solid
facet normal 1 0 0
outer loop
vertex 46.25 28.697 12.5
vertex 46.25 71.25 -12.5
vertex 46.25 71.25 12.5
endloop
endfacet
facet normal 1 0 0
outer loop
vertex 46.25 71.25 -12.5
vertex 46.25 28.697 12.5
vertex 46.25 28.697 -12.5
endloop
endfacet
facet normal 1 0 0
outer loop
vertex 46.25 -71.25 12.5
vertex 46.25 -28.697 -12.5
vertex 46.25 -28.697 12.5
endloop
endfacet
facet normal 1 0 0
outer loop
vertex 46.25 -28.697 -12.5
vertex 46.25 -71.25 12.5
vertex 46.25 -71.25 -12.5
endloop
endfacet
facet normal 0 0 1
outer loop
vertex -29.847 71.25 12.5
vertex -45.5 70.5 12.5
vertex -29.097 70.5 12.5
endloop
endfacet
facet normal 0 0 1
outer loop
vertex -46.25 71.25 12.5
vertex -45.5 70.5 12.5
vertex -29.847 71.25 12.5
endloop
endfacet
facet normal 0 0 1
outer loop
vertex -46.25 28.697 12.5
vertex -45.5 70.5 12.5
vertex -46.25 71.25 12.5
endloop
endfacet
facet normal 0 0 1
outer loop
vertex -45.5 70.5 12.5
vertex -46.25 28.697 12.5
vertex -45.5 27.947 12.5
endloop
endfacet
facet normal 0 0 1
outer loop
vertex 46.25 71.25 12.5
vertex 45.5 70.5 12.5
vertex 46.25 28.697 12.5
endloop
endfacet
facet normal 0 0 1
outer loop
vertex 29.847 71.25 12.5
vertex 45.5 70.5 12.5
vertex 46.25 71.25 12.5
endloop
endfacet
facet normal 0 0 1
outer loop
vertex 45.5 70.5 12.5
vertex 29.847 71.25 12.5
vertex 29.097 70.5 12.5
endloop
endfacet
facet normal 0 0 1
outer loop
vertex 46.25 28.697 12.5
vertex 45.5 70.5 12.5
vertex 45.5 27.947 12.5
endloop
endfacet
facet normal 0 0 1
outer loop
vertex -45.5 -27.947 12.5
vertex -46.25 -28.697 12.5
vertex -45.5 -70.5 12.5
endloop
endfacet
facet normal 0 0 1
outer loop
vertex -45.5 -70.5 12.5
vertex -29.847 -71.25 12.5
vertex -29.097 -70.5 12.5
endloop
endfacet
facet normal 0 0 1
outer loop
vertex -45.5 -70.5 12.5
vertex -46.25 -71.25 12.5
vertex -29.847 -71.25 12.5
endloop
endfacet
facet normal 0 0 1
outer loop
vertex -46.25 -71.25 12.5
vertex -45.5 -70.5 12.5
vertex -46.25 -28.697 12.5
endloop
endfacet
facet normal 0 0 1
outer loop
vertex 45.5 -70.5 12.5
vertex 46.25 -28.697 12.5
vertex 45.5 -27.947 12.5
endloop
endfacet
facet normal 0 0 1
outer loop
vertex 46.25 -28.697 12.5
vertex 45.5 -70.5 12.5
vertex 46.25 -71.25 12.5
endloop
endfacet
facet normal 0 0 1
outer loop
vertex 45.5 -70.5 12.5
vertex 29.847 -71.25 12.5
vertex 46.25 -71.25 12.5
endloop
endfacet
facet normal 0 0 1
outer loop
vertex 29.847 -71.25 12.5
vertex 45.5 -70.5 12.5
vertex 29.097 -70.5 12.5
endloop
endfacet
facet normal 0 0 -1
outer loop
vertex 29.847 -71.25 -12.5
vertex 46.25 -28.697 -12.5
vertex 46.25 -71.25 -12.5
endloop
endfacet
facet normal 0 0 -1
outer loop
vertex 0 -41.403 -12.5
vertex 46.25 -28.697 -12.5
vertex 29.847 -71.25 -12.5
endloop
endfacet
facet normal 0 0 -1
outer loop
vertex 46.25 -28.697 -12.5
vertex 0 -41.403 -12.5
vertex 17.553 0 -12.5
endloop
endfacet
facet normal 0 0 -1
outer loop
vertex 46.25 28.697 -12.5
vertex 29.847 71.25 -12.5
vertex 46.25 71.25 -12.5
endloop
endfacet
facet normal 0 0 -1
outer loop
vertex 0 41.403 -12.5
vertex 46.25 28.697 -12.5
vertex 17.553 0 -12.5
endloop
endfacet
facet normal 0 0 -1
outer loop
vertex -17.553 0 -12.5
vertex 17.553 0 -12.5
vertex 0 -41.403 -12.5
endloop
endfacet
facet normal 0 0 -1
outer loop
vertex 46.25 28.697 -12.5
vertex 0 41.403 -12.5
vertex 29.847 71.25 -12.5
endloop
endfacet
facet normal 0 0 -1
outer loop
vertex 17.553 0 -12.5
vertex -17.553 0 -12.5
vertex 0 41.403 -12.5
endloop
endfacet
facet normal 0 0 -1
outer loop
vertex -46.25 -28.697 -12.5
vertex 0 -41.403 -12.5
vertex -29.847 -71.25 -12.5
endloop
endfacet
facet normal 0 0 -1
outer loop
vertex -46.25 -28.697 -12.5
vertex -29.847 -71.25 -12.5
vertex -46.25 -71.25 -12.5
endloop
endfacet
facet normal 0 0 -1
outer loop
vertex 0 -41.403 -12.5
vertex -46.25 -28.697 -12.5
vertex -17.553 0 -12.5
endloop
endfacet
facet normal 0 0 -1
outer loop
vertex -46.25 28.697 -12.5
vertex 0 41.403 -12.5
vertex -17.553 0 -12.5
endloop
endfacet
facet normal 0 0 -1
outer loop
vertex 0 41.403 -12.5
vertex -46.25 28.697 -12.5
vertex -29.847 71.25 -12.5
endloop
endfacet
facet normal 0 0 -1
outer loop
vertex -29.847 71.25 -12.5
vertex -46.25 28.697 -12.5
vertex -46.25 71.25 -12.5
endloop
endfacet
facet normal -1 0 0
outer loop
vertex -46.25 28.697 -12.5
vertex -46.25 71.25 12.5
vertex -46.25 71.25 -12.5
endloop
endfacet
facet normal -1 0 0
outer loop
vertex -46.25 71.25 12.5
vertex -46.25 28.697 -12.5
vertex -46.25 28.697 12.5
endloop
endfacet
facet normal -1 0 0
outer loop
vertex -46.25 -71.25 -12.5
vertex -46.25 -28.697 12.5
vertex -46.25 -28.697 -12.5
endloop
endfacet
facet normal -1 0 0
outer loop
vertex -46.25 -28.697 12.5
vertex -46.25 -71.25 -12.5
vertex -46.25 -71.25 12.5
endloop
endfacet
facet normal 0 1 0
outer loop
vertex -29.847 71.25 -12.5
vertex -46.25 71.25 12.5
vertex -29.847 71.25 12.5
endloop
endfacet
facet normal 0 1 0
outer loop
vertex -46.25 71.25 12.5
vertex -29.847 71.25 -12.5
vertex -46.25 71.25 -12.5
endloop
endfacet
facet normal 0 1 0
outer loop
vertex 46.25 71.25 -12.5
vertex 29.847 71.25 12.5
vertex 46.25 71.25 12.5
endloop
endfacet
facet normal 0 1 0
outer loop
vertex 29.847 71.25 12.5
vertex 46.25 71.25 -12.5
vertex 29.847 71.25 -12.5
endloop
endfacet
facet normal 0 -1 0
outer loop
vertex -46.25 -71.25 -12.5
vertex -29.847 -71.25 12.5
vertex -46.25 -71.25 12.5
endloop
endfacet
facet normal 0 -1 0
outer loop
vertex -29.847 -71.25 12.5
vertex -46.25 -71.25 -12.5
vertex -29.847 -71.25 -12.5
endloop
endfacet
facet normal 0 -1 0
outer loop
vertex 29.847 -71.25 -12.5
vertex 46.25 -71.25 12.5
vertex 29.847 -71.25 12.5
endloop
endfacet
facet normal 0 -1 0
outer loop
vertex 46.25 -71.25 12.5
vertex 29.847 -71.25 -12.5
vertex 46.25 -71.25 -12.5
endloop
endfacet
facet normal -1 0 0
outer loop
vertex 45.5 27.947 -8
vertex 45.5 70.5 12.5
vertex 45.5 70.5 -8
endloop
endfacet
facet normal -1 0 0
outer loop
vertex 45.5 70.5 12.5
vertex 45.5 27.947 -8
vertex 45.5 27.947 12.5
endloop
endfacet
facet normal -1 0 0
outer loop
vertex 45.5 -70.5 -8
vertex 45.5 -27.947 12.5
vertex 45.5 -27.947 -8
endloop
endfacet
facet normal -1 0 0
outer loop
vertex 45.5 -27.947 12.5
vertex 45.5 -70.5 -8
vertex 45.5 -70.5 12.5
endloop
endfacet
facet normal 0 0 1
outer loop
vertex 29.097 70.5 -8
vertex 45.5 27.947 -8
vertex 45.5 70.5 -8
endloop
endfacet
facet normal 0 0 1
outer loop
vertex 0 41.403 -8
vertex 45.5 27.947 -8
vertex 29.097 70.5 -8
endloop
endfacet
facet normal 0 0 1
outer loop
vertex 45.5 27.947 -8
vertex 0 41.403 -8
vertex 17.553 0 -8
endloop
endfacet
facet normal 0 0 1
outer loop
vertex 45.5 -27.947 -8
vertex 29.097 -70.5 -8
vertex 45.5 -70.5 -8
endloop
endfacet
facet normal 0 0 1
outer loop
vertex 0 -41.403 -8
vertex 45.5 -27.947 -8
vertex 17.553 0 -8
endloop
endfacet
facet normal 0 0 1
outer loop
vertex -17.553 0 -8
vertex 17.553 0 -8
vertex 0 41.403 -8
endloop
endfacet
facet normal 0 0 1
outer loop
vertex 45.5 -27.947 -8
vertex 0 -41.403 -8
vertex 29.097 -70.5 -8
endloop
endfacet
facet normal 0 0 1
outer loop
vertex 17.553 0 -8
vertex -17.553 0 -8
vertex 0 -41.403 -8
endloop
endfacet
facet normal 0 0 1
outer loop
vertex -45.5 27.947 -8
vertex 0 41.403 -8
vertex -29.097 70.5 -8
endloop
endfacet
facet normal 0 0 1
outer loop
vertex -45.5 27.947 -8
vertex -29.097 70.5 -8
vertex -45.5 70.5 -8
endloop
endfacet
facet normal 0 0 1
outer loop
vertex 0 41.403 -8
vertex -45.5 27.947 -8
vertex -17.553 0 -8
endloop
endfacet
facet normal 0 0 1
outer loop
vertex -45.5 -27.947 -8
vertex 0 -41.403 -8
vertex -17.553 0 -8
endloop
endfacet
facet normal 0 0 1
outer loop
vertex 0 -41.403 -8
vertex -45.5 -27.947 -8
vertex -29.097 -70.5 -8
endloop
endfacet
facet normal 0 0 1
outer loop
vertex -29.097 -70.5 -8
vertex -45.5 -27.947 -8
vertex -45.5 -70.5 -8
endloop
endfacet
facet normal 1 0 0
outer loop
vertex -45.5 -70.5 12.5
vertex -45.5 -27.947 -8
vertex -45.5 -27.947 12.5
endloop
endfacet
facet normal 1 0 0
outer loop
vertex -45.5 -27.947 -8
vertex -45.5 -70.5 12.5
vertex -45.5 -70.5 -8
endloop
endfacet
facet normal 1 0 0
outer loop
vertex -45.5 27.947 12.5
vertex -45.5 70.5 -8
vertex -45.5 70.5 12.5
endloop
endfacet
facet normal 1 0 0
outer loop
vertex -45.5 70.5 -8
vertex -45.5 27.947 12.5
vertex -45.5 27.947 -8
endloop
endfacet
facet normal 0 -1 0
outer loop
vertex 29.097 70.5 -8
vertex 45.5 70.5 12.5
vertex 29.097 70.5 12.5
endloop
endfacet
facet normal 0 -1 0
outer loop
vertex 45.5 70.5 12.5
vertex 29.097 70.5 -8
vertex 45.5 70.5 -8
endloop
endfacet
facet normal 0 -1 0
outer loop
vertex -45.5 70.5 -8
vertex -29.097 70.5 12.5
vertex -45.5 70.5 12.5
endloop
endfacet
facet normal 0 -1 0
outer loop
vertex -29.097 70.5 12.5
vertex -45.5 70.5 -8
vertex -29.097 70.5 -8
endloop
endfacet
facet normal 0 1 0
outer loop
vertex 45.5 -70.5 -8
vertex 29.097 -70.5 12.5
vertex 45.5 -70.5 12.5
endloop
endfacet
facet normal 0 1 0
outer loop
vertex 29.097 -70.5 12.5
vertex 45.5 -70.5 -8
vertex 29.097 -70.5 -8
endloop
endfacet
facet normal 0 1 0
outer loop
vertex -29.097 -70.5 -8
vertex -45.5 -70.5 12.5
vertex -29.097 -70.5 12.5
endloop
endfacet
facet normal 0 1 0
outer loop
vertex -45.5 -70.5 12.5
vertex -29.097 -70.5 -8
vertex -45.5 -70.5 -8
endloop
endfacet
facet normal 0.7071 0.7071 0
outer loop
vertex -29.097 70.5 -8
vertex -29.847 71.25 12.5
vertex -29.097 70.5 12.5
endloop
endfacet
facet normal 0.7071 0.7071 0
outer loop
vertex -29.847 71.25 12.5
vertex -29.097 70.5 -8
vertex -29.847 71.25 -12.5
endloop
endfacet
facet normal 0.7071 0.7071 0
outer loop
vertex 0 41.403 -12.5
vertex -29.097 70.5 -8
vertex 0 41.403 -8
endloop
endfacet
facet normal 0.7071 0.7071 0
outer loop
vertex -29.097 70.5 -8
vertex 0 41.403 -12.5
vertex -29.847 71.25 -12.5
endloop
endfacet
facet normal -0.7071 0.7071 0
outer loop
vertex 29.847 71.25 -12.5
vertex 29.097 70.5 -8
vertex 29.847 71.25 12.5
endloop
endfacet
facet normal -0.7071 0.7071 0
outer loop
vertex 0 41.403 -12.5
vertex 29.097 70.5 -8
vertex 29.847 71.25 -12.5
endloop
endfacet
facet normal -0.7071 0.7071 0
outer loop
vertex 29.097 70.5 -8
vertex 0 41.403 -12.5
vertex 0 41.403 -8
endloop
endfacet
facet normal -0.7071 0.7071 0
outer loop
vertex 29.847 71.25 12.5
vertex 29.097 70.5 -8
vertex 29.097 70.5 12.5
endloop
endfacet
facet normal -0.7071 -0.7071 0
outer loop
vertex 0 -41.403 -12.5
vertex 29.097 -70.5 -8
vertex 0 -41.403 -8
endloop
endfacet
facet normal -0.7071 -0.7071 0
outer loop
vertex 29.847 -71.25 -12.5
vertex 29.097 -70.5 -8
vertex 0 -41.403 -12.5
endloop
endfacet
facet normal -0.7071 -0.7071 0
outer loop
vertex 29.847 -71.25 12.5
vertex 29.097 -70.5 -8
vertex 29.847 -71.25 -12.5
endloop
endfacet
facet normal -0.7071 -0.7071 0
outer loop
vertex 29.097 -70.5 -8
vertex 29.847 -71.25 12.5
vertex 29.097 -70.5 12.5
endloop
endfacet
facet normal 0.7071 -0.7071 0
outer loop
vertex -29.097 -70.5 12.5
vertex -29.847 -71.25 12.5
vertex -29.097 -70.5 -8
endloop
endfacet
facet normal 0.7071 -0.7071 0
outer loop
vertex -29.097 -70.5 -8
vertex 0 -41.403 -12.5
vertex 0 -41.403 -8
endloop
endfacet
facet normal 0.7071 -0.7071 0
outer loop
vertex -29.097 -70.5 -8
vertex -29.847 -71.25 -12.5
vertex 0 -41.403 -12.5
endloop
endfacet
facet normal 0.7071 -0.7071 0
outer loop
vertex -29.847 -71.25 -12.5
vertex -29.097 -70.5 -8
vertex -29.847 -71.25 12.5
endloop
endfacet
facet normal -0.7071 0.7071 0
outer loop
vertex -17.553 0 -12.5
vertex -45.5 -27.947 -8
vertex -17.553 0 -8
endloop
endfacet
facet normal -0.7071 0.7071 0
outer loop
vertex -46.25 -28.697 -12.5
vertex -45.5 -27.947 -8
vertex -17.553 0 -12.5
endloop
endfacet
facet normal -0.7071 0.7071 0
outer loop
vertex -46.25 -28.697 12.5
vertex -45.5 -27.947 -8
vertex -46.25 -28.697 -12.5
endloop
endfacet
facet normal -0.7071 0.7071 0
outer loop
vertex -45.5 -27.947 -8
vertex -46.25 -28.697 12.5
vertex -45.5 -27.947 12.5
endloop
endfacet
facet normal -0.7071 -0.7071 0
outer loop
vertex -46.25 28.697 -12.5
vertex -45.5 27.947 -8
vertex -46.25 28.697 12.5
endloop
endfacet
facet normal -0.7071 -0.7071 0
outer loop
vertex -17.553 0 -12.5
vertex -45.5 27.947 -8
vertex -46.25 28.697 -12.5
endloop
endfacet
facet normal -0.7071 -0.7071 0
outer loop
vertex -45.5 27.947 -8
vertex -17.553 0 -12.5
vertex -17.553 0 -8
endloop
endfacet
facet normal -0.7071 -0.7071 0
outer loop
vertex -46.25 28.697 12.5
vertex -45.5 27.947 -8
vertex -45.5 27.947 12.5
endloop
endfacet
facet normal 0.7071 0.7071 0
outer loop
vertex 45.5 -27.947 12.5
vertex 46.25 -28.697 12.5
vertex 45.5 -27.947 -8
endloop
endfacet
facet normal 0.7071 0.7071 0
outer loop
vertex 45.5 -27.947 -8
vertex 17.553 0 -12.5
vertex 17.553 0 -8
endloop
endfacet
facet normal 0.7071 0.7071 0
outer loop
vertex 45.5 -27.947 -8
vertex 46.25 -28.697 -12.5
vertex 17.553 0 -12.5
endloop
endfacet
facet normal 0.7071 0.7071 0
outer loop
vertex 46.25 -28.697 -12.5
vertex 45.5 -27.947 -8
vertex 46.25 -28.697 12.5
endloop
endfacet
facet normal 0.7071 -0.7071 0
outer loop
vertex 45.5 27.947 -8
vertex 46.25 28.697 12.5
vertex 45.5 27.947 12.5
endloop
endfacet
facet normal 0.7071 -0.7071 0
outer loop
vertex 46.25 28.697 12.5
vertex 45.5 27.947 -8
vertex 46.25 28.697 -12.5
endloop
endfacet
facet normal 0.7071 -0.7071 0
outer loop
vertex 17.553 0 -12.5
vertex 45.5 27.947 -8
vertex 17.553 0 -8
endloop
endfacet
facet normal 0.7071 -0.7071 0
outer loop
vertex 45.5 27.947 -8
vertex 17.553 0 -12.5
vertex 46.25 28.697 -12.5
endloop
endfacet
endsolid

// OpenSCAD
WIDTH=91;
LENGTH=141;
HEIGHT=22;
WALL=1.5;
BOTTOM=3;

module paper_tray (w, b, h, d, bottom) {
    difference() {
           cube([w+d, b+d, h+bottom], center=true);
           translate([0,0, bottom]) cube([w, b, h], center=true);
           translate([0, 0.75*b, 0]) rotate([0,0,45]) cube([w, w,2*h], center=true);
           translate([0, -0.75*b, 0]) rotate([0,0,45]) cube([w, w,2*h], center=true);
           translate([-0.9*w, 0, 0]) rotate([0,0,45]) cube([w, w,2*h], center=true);
           translate([0.9*w, 0, 0]) rotate([0,0,45]) cube([w, w,2*h], center=true);
    }
}

paper_tray(w=WIDTH, b=LENGTH, h=HEIGHT, d=WALL, bottom=BOTTOM);
